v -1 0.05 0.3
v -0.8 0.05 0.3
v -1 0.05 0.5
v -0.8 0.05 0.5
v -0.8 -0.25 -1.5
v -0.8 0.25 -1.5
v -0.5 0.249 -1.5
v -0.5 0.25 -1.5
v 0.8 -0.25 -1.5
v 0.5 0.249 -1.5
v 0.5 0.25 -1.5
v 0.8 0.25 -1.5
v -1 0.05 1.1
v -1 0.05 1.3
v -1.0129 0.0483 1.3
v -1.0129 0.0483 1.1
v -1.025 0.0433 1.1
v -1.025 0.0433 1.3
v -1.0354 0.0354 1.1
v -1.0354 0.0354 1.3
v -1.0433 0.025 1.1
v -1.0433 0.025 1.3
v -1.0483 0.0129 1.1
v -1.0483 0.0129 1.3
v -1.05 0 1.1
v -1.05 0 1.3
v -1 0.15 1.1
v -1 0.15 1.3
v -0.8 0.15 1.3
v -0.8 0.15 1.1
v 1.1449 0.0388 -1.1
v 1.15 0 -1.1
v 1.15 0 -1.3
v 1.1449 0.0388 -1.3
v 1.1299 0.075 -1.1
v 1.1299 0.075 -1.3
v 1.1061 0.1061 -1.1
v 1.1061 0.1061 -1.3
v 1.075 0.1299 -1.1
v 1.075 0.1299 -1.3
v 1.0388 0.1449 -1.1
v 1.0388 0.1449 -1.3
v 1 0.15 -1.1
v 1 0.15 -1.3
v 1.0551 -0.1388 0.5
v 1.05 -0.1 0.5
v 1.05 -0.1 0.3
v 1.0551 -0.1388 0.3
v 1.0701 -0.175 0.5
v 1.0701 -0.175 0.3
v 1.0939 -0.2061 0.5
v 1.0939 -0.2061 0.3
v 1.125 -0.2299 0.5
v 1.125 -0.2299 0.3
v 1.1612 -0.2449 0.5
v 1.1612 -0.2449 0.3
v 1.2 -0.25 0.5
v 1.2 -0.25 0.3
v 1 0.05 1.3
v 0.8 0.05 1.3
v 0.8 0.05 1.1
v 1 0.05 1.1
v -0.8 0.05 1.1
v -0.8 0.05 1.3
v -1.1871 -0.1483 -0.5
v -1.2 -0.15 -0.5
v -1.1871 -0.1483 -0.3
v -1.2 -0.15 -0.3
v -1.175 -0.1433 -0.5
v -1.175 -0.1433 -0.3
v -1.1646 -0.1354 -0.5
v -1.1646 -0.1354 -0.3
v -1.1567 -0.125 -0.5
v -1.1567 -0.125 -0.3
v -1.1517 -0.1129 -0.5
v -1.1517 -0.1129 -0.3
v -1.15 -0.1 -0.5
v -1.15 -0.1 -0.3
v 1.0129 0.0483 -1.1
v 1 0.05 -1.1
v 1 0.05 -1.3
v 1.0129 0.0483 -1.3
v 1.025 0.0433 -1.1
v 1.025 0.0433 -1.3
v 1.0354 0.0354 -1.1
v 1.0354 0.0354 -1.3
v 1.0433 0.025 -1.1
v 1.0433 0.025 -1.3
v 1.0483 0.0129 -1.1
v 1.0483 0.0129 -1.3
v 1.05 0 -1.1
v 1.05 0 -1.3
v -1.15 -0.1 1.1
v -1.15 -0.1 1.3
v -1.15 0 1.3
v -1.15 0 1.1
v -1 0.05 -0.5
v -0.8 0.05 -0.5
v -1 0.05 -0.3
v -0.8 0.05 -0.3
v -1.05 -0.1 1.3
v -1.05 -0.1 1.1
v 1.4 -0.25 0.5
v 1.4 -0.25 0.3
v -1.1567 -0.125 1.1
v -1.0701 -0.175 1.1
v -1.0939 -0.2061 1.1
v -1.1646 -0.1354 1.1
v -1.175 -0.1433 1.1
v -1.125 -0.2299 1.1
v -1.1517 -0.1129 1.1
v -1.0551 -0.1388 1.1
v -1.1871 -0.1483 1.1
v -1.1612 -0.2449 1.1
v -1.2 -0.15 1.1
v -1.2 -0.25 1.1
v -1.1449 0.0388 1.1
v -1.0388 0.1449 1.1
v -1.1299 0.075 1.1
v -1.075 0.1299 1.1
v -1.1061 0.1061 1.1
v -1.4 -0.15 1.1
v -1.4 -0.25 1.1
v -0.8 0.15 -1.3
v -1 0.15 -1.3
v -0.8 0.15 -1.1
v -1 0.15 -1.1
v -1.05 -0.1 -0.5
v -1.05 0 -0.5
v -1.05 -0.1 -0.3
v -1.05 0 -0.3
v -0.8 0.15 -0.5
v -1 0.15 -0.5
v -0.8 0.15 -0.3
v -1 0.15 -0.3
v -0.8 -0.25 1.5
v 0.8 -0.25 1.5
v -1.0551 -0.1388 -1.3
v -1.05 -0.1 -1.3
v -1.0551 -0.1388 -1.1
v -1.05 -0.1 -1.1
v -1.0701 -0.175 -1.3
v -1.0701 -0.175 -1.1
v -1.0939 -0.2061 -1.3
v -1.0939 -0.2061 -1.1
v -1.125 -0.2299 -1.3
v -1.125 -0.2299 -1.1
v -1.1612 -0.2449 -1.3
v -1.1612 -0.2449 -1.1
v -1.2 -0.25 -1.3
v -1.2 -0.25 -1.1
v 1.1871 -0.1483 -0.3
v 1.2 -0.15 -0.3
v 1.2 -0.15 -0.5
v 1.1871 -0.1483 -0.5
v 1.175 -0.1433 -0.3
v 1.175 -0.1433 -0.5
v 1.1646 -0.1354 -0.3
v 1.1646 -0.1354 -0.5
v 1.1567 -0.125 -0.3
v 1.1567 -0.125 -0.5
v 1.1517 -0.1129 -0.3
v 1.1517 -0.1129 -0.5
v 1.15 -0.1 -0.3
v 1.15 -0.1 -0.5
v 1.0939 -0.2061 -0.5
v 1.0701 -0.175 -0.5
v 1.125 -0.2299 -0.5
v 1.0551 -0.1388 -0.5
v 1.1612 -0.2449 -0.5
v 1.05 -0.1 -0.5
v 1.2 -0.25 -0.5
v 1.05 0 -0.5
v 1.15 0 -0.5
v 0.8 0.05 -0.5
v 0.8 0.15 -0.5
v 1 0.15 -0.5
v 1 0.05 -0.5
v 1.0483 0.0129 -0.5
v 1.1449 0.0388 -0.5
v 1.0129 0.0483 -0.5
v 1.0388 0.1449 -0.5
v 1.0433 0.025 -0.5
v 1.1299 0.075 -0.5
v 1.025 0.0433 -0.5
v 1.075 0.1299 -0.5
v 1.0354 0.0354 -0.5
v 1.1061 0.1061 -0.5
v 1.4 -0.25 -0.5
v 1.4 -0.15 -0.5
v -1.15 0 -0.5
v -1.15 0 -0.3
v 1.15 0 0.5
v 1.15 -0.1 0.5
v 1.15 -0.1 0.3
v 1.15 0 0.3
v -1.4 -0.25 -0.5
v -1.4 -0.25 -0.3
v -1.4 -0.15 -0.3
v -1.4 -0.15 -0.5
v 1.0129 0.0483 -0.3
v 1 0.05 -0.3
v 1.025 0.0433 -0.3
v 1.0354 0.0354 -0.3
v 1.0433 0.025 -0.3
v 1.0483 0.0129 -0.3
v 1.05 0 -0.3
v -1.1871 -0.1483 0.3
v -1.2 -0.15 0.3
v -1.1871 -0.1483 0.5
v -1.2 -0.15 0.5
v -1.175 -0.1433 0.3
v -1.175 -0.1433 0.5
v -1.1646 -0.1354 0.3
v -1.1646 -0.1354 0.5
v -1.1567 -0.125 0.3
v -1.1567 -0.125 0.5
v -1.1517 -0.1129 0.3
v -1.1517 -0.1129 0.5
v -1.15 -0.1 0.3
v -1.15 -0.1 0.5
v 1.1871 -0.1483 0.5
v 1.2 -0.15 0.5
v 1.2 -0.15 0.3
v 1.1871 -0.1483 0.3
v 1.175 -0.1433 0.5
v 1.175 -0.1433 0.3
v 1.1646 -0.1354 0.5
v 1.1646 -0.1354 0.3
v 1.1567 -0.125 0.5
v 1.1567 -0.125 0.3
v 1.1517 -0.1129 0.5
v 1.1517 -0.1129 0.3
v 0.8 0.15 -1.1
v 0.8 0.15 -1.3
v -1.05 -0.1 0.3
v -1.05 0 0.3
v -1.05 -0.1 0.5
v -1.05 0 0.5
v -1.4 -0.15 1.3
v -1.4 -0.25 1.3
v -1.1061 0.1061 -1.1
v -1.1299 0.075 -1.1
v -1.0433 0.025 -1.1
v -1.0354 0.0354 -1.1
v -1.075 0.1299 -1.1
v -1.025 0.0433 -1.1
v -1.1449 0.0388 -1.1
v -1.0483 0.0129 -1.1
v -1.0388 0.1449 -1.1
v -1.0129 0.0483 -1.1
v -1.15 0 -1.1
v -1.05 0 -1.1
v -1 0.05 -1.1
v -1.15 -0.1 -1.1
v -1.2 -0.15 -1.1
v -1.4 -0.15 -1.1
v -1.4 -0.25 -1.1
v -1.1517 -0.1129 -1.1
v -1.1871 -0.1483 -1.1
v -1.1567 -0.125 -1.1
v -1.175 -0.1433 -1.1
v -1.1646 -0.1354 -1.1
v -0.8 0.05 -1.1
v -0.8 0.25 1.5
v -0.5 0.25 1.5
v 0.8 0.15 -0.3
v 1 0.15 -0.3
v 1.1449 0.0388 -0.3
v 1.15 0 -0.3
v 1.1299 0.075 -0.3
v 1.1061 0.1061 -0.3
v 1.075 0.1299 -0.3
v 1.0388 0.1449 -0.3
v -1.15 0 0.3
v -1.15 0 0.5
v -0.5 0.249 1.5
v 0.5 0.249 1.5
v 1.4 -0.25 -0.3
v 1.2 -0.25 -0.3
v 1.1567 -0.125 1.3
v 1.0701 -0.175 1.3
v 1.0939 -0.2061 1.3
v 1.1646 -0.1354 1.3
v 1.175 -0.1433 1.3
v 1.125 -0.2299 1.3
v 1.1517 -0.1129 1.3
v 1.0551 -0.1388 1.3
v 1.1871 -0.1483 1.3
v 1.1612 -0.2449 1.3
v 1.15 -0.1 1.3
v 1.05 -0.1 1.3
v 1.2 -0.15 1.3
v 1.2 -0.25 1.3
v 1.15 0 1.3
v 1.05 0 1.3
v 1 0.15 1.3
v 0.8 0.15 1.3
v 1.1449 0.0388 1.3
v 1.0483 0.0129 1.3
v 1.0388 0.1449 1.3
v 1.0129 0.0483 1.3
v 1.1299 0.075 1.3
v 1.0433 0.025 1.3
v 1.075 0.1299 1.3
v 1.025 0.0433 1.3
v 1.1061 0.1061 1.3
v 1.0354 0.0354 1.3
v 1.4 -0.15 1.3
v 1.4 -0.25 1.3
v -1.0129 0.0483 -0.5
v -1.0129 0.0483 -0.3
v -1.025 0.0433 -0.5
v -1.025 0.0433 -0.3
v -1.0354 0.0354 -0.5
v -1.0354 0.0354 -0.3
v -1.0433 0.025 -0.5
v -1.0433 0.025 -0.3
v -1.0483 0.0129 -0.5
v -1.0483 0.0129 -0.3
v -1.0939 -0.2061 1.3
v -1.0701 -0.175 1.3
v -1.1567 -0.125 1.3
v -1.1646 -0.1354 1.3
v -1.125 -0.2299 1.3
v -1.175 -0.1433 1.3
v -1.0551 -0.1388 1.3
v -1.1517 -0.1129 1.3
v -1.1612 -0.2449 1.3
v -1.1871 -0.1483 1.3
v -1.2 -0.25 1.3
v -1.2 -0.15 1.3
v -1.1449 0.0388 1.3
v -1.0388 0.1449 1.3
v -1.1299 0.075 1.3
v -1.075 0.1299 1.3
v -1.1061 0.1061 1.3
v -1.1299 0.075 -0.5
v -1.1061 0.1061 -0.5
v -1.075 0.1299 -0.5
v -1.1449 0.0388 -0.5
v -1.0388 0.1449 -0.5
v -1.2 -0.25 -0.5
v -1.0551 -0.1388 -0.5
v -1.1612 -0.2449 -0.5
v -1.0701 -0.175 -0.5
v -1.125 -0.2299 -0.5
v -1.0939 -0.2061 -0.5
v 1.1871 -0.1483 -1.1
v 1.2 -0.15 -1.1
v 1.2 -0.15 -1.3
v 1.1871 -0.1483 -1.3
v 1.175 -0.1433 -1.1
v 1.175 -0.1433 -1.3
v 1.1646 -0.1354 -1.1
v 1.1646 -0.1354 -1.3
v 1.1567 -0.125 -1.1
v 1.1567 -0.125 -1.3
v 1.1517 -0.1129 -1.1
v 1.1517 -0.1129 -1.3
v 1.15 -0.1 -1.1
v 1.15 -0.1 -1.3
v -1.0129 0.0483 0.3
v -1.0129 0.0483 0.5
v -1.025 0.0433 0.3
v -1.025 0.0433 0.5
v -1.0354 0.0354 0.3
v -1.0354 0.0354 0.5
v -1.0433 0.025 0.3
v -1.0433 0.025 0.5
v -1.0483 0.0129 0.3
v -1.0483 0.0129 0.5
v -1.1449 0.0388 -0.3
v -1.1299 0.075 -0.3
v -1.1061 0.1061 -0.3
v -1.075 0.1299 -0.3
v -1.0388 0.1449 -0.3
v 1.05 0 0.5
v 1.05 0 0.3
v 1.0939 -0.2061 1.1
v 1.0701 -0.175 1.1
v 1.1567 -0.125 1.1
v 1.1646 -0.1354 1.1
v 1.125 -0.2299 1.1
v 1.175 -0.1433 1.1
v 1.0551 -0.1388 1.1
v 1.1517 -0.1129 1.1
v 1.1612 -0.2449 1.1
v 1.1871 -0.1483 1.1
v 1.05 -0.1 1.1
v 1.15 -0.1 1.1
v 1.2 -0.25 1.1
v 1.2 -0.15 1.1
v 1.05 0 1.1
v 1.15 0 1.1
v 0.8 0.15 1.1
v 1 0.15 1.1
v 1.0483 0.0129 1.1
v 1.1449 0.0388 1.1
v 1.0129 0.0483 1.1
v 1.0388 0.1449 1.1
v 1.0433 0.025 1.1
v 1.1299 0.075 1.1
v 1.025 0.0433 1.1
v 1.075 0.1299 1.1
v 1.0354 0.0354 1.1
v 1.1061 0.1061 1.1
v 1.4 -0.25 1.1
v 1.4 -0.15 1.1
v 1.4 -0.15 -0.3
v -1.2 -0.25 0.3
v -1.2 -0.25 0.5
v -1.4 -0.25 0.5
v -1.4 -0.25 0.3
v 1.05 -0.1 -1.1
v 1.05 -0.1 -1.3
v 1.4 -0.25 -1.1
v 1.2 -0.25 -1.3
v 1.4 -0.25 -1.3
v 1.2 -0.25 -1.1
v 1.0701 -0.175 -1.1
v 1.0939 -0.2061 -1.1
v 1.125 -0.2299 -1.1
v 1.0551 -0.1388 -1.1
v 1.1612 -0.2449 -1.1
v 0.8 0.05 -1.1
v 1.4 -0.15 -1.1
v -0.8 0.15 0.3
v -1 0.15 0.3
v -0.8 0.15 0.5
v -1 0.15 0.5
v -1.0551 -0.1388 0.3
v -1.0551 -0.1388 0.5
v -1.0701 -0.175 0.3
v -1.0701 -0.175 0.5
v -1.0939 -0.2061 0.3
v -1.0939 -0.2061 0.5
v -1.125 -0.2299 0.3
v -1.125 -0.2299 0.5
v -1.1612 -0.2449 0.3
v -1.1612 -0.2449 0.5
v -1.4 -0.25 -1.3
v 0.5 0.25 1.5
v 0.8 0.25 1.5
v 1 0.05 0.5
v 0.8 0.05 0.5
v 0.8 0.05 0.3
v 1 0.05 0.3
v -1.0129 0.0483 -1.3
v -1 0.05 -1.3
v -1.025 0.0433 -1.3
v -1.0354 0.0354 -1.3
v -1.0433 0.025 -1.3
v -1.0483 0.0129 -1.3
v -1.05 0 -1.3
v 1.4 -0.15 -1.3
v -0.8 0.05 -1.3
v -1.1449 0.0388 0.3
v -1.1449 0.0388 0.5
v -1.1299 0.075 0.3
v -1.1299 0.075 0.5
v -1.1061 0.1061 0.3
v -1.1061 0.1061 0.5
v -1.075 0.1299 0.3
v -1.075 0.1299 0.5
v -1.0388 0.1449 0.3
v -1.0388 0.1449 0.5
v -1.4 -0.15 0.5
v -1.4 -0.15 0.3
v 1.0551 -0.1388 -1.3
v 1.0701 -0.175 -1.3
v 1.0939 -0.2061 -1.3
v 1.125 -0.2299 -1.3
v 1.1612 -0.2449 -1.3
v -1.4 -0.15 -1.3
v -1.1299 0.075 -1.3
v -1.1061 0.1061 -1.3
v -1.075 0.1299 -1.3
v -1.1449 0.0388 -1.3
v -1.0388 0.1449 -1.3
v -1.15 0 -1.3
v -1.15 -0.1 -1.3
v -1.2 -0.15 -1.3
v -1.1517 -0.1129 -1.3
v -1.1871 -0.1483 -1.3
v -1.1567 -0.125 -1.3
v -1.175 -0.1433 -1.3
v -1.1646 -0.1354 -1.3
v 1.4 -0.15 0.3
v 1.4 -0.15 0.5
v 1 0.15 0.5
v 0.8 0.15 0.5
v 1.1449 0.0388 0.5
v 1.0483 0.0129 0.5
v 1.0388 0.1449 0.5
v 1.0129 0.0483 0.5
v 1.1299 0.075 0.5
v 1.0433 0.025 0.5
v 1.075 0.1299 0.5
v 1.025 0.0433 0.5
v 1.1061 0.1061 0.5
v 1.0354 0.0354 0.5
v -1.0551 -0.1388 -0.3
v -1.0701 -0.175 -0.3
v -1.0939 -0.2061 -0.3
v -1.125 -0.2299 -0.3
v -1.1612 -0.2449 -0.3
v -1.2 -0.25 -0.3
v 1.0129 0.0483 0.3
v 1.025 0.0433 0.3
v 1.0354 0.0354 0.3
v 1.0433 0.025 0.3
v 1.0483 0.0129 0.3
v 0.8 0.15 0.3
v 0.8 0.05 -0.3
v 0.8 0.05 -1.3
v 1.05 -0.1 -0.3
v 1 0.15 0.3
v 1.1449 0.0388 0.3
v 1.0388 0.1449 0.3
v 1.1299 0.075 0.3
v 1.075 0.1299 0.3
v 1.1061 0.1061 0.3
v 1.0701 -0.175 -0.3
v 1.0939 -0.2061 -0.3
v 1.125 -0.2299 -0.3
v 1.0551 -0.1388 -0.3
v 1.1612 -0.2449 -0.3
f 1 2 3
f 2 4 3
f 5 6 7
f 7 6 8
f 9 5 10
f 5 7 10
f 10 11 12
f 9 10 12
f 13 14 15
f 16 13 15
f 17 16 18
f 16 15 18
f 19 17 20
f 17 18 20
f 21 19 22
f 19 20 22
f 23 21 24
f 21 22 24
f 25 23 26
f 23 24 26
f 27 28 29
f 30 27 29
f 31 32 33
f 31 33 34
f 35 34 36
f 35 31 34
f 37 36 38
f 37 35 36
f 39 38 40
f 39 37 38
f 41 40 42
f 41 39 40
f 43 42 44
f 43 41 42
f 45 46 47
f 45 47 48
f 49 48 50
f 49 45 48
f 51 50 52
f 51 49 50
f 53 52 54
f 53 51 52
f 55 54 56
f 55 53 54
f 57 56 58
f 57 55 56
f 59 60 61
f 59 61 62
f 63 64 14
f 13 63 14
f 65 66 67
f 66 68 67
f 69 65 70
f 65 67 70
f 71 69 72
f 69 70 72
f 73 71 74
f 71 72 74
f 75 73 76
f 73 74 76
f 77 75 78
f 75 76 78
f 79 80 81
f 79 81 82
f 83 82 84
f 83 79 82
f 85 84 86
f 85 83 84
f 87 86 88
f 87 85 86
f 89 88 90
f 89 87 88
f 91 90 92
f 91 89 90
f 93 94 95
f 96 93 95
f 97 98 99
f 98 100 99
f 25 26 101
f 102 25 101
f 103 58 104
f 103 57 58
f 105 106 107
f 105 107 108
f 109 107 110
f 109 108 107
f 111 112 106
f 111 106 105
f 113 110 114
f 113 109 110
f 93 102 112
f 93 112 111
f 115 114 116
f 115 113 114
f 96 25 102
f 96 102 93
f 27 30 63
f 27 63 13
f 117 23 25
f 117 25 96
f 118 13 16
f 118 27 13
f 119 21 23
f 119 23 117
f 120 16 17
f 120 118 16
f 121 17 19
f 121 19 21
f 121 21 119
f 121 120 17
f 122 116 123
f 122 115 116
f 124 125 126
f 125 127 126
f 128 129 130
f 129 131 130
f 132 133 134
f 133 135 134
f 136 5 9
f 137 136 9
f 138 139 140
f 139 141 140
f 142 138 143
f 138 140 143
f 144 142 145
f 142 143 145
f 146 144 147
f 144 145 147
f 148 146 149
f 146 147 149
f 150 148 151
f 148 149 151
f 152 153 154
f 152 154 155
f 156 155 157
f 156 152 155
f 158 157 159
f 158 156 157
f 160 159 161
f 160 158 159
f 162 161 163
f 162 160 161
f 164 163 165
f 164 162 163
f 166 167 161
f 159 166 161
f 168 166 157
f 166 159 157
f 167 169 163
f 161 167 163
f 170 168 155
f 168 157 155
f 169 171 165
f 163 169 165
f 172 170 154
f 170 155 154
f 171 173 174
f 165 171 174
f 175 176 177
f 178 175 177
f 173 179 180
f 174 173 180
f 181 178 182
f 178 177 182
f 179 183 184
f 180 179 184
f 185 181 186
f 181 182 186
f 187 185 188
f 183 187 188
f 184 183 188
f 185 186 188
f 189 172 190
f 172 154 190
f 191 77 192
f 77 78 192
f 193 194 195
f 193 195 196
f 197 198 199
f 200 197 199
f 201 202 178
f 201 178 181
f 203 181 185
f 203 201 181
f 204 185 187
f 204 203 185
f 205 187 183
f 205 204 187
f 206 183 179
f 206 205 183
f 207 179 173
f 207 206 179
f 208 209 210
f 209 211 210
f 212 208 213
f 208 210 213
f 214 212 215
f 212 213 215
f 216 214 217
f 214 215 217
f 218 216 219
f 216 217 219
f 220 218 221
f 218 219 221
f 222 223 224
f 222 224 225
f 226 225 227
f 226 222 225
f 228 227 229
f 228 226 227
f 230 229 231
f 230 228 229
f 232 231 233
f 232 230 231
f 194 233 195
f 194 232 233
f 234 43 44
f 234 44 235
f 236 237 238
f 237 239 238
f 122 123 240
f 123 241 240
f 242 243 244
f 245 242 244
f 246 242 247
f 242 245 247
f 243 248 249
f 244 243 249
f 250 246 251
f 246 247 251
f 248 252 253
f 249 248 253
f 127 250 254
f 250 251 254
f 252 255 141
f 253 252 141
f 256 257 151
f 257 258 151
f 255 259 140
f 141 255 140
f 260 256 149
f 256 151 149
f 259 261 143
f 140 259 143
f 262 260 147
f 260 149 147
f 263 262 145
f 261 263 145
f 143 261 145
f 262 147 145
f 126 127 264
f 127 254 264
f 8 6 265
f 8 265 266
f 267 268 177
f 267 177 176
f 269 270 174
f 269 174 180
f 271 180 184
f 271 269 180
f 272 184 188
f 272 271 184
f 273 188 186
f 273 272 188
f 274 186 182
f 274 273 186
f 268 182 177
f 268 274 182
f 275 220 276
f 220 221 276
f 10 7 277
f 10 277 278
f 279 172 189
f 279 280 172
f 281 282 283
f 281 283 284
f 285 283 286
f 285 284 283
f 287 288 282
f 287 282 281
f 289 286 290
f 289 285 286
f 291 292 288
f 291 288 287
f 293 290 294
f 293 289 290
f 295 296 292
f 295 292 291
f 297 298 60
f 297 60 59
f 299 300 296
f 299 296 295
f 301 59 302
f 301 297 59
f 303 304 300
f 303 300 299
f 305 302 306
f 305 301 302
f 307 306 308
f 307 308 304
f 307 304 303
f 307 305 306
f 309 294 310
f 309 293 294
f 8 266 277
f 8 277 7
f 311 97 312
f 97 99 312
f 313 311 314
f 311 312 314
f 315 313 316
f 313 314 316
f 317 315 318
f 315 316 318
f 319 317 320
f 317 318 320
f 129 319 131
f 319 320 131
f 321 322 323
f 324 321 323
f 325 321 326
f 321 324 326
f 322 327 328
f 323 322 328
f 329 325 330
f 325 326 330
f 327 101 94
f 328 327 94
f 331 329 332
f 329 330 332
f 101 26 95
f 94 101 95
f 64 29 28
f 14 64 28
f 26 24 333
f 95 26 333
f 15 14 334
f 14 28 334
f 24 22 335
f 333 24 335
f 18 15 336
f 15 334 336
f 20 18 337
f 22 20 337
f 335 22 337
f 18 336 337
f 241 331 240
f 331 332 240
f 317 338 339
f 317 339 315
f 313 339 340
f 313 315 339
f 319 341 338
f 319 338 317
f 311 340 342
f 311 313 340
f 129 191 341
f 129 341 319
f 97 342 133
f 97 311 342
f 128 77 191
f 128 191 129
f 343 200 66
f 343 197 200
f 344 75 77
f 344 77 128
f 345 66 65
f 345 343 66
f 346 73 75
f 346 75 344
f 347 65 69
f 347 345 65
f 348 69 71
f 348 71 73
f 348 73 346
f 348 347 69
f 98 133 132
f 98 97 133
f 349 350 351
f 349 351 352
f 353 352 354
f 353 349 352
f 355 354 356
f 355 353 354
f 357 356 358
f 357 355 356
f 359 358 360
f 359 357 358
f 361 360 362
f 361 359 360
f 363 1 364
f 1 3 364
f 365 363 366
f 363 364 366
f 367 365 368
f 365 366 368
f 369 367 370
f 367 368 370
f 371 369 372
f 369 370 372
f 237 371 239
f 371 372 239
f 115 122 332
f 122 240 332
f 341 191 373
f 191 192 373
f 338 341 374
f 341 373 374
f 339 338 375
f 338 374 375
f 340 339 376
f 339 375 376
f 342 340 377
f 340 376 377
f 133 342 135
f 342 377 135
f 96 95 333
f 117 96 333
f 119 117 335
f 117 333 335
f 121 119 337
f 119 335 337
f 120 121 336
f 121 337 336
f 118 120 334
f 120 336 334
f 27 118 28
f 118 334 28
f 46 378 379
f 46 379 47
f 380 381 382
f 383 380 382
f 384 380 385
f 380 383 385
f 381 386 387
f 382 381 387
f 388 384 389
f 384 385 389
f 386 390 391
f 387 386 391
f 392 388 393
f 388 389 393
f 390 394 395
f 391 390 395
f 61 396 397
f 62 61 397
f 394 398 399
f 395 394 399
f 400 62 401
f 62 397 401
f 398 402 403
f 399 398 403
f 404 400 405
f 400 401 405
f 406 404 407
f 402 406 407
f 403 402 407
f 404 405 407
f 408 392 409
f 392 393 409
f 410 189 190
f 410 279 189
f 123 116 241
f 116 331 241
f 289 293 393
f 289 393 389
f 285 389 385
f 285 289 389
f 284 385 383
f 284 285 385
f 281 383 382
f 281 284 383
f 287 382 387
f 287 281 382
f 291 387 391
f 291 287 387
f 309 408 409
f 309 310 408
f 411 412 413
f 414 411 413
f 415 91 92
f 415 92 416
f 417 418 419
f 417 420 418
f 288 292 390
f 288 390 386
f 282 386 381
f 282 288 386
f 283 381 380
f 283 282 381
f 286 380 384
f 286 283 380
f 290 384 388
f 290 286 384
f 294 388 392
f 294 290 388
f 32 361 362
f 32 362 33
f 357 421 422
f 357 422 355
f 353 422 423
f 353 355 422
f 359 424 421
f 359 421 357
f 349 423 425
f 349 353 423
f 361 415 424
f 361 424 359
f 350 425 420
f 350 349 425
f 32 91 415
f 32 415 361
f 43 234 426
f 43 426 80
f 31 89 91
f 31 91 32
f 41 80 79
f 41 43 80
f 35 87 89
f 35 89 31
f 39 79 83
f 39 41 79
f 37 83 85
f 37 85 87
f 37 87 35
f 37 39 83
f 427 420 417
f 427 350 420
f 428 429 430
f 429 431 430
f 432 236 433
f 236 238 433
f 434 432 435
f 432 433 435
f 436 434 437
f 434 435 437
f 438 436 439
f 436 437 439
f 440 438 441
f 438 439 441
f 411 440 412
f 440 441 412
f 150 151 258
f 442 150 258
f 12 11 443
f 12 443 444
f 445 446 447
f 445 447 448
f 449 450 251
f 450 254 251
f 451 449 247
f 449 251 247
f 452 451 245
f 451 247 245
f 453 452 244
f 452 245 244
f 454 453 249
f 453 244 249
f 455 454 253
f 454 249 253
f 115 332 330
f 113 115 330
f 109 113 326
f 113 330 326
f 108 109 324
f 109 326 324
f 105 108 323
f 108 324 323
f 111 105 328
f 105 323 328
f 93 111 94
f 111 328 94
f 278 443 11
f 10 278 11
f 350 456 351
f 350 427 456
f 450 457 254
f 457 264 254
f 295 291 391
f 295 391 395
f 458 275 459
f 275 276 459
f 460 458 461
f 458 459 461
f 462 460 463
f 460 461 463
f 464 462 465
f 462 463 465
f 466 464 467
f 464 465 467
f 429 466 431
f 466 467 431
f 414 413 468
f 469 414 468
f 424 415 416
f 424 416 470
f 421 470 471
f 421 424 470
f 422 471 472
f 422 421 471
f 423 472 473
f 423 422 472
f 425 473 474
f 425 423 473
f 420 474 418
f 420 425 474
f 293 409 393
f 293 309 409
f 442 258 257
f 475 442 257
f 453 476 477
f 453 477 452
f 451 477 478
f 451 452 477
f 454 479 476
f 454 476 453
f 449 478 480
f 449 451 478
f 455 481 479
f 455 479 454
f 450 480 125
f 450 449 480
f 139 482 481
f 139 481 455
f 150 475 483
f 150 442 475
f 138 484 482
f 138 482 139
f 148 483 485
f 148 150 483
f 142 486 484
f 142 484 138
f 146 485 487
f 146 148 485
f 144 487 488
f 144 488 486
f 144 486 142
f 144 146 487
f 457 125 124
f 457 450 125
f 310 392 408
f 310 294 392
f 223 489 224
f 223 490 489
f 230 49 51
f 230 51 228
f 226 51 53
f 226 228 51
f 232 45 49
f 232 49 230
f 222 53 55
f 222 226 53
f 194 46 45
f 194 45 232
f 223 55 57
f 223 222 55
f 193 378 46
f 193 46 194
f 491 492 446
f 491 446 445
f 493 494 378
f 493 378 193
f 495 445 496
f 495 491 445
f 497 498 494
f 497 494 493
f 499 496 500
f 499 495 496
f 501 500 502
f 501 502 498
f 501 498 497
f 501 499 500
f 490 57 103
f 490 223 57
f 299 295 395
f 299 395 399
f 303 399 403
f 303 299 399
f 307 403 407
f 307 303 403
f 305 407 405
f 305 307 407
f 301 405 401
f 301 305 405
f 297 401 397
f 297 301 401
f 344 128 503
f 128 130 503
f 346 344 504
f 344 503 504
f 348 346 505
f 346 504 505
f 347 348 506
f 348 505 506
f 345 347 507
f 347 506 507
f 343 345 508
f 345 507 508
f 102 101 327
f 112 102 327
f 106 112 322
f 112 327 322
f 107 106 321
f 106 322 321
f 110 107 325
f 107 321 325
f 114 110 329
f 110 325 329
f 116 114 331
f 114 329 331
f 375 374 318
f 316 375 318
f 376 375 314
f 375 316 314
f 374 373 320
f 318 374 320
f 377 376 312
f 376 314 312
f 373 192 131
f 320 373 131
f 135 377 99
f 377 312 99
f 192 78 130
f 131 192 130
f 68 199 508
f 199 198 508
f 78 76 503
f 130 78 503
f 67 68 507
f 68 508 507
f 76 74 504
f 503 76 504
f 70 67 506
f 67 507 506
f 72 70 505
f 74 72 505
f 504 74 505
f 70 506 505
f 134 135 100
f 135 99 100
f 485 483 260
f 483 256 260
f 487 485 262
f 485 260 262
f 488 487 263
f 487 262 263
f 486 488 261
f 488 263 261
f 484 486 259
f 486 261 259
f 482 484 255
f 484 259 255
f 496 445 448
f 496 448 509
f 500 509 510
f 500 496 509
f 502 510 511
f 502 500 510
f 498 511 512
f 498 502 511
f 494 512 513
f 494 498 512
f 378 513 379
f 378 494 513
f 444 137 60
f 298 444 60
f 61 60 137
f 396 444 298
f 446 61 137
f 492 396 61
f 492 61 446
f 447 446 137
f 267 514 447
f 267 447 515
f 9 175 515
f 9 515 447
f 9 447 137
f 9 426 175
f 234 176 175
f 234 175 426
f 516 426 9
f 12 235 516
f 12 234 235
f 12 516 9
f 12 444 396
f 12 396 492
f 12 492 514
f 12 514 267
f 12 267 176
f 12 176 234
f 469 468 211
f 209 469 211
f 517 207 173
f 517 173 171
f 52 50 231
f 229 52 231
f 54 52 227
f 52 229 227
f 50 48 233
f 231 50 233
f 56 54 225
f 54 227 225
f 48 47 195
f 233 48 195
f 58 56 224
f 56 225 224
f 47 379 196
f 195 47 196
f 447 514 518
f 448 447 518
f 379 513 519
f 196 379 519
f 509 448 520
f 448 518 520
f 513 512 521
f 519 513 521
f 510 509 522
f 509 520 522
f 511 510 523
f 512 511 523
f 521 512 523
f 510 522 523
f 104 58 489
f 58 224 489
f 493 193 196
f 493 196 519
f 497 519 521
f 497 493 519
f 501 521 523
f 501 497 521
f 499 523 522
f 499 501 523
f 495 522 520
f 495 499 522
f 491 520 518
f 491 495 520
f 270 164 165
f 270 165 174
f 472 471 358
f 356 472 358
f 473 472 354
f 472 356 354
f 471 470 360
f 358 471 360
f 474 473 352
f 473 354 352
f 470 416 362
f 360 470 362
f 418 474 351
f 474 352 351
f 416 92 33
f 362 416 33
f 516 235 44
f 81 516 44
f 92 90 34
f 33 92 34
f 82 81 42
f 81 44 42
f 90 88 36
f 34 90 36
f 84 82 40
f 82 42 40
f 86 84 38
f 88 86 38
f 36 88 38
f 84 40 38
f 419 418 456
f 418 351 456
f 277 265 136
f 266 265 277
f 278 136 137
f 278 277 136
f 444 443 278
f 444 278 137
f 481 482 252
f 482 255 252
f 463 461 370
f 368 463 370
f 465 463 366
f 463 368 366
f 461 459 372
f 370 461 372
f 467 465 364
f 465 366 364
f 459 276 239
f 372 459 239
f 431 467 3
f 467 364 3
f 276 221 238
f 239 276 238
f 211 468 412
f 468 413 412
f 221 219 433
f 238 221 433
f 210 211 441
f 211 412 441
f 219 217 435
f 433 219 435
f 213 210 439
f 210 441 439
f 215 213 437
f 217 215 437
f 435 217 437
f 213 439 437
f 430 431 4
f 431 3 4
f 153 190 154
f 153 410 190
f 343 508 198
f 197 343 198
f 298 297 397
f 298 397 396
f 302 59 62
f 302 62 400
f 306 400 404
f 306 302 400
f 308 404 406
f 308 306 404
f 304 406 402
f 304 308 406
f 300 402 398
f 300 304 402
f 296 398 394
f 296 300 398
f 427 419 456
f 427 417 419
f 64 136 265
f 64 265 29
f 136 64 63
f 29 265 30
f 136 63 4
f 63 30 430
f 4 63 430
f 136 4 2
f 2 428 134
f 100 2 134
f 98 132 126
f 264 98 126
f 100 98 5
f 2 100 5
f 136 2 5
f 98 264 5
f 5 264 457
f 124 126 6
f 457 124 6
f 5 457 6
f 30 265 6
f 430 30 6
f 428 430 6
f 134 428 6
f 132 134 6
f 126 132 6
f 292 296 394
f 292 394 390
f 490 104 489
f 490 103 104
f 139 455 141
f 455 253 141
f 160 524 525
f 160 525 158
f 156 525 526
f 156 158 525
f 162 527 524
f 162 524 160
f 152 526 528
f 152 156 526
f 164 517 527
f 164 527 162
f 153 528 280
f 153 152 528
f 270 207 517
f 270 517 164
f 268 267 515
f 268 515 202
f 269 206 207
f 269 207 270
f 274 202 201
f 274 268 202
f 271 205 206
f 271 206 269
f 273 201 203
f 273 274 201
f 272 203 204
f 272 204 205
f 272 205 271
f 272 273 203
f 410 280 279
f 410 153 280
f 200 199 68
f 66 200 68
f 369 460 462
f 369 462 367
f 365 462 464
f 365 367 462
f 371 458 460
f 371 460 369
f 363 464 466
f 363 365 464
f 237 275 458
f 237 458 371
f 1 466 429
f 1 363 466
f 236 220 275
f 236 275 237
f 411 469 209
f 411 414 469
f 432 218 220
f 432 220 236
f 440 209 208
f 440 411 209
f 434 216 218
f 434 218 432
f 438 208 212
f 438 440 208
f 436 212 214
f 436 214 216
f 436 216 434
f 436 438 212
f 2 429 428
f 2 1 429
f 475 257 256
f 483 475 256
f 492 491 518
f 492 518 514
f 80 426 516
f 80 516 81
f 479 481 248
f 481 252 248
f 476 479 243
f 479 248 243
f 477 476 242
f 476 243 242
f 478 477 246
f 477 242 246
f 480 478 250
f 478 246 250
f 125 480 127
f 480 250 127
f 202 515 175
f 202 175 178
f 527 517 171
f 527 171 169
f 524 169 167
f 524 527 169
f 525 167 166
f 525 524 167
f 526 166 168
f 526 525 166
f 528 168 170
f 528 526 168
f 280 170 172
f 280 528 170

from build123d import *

# Parameters (mm, degrees)
BASES_W              = 1.6
BASES_H              = 3
BASE_DEPTH           = 0.25
MIDDLELEG_DEPTH      = 0.1
LPATTERN1_COUNT      = 4
LPATTERN1_PITCH      = 0.8
MIRROR1_COPY_1_DEPTH = 0.1
MIRROR1_COPY_2_DEPTH = 0.1
MIRROR1_COPY_3_DEPTH = 0.1
TEXTCUTS_W           = 1
TEXTCUTS_H           = 3
TEXTCUT_DEPTH        = 0.001


with BuildPart() as part:
    # BaseS → Base (new body, symmetric)
    with BuildSketch(Plane(origin=(0, 0, 0), x_dir=(1, 0, 0), z_dir=(0, 1, 0))):
        Rectangle(BASES_W, BASES_H)
    extrude(amount=BASE_DEPTH, both=True)

    # MiddleLegS → MiddleLeg (add, symmetric)
    with BuildSketch(Plane.XY.offset(1.2)):
        with BuildLine():
            Line((1.4, -0.15), (1.2, -0.15))
            ThreePointArc((1.2, -0.15), (1.164644661, -0.135355339), (1.15, -0.1))
            Line((1.15, -0.1), (1.15, 0))
            ThreePointArc((1.15, 0), (1.106066017, 0.106066017), (1, 0.15))
            Line((1, 0.15), (0.8, 0.15))
            Line((0.8, 0.15), (0.8, 0.05))
            Line((0.8, 0.05), (1, 0.05))
            ThreePointArc((1, 0.05), (1.035355339, 0.035355339), (1.05, 0))
            Line((1.05, 0), (1.05, -0.1))
            ThreePointArc((1.05, -0.1), (1.093933983, -0.206066017), (1.2, -0.25))
            Line((1.2, -0.25), (1.4, -0.25))
            Line((1.4, -0.25), (1.4, -0.15))
        make_face()
    middleleg = extrude(amount=MIDDLELEG_DEPTH, both=True)

    # LPattern1: MiddleLeg ×4
    with Locations(*[(0, 0, -i * LPATTERN1_PITCH) for i in range(1, LPATTERN1_COUNT)]):
        add(middleleg)

    # Mirror1: MiddleLeg across plane
    add(middleleg.mirror(Plane(origin=(0, 0, 0), x_dir=(0, 0, 1), z_dir=(1, 0, 0))))

    # Mirror1 copy 1 sketch → Mirror1 copy 1 (add, symmetric)
    with BuildSketch(Plane(origin=(0, 0, 0.4), x_dir=(-1, 0, 0), z_dir=(0, 0, 1))):
        with BuildLine():
            Line((1.4, 0.15), (1.2, 0.15))
            ThreePointArc((1.2, 0.15), (1.164644661, 0.135355339), (1.15, 0.1))
            Line((1.15, 0.1), (1.15, 0))
            ThreePointArc((1.15, 0), (1.106066017, -0.106066017), (1, -0.15))
            Line((1, -0.15), (0.8, -0.15))
            Line((0.8, -0.15), (0.8, -0.05))
            Line((0.8, -0.05), (1, -0.05))
            ThreePointArc((1, -0.05), (1.035355339, -0.035355339), (1.05, 0))
            Line((1.05, 0), (1.05, 0.1))
            ThreePointArc((1.05, 0.1), (1.093933983, 0.206066017), (1.2, 0.25))
            Line((1.2, 0.25), (1.4, 0.25))
            Line((1.4, 0.25), (1.4, 0.15))
        make_face()
    extrude(amount=MIRROR1_COPY_1_DEPTH, both=True)

    # Mirror1 copy 2 sketch → Mirror1 copy 2 (add, symmetric)
    with BuildSketch(Plane(origin=(0, 0, -0.4), x_dir=(-1, 0, 0), z_dir=(0, 0, 1))):
        with BuildLine():
            Line((1.4, 0.15), (1.2, 0.15))
            ThreePointArc((1.2, 0.15), (1.164644661, 0.135355339), (1.15, 0.1))
            Line((1.15, 0.1), (1.15, 0))
            ThreePointArc((1.15, 0), (1.106066017, -0.106066017), (1, -0.15))
            Line((1, -0.15), (0.8, -0.15))
            Line((0.8, -0.15), (0.8, -0.05))
            Line((0.8, -0.05), (1, -0.05))
            ThreePointArc((1, -0.05), (1.035355339, -0.035355339), (1.05, 0))
            Line((1.05, 0), (1.05, 0.1))
            ThreePointArc((1.05, 0.1), (1.093933983, 0.206066017), (1.2, 0.25))
            Line((1.2, 0.25), (1.4, 0.25))
            Line((1.4, 0.25), (1.4, 0.15))
        make_face()
    extrude(amount=MIRROR1_COPY_2_DEPTH, both=True)

    # Mirror1 copy 3 sketch → Mirror1 copy 3 (add, symmetric)
    with BuildSketch(Plane(origin=(0, 0, -1.2), x_dir=(-1, 0, 0), z_dir=(0, 0, 1))):
        with BuildLine():
            Line((1.4, 0.15), (1.2, 0.15))
            ThreePointArc((1.2, 0.15), (1.164644661, 0.135355339), (1.15, 0.1))
            Line((1.15, 0.1), (1.15, 0))
            ThreePointArc((1.15, 0), (1.106066017, -0.106066017), (1, -0.15))
            Line((1, -0.15), (0.8, -0.15))
            Line((0.8, -0.15), (0.8, -0.05))
            Line((0.8, -0.05), (1, -0.05))
            ThreePointArc((1, -0.05), (1.035355339, -0.035355339), (1.05, 0))
            Line((1.05, 0), (1.05, 0.1))
            ThreePointArc((1.05, 0.1), (1.093933983, 0.206066017), (1.2, 0.25))
            Line((1.2, 0.25), (1.4, 0.25))
            Line((1.4, 0.25), (1.4, 0.15))
        make_face()
    extrude(amount=MIRROR1_COPY_3_DEPTH, both=True)

    # TextCutS → TextCut (cut)
    with BuildSketch(Plane(origin=(0, 0.25, 0), x_dir=(1, 0, 0), z_dir=(0, 1, 0))):
        Rectangle(TEXTCUTS_W, TEXTCUTS_H)
    extrude(amount=-TEXTCUT_DEPTH, mode=Mode.SUBTRACT)


solid = part.part
